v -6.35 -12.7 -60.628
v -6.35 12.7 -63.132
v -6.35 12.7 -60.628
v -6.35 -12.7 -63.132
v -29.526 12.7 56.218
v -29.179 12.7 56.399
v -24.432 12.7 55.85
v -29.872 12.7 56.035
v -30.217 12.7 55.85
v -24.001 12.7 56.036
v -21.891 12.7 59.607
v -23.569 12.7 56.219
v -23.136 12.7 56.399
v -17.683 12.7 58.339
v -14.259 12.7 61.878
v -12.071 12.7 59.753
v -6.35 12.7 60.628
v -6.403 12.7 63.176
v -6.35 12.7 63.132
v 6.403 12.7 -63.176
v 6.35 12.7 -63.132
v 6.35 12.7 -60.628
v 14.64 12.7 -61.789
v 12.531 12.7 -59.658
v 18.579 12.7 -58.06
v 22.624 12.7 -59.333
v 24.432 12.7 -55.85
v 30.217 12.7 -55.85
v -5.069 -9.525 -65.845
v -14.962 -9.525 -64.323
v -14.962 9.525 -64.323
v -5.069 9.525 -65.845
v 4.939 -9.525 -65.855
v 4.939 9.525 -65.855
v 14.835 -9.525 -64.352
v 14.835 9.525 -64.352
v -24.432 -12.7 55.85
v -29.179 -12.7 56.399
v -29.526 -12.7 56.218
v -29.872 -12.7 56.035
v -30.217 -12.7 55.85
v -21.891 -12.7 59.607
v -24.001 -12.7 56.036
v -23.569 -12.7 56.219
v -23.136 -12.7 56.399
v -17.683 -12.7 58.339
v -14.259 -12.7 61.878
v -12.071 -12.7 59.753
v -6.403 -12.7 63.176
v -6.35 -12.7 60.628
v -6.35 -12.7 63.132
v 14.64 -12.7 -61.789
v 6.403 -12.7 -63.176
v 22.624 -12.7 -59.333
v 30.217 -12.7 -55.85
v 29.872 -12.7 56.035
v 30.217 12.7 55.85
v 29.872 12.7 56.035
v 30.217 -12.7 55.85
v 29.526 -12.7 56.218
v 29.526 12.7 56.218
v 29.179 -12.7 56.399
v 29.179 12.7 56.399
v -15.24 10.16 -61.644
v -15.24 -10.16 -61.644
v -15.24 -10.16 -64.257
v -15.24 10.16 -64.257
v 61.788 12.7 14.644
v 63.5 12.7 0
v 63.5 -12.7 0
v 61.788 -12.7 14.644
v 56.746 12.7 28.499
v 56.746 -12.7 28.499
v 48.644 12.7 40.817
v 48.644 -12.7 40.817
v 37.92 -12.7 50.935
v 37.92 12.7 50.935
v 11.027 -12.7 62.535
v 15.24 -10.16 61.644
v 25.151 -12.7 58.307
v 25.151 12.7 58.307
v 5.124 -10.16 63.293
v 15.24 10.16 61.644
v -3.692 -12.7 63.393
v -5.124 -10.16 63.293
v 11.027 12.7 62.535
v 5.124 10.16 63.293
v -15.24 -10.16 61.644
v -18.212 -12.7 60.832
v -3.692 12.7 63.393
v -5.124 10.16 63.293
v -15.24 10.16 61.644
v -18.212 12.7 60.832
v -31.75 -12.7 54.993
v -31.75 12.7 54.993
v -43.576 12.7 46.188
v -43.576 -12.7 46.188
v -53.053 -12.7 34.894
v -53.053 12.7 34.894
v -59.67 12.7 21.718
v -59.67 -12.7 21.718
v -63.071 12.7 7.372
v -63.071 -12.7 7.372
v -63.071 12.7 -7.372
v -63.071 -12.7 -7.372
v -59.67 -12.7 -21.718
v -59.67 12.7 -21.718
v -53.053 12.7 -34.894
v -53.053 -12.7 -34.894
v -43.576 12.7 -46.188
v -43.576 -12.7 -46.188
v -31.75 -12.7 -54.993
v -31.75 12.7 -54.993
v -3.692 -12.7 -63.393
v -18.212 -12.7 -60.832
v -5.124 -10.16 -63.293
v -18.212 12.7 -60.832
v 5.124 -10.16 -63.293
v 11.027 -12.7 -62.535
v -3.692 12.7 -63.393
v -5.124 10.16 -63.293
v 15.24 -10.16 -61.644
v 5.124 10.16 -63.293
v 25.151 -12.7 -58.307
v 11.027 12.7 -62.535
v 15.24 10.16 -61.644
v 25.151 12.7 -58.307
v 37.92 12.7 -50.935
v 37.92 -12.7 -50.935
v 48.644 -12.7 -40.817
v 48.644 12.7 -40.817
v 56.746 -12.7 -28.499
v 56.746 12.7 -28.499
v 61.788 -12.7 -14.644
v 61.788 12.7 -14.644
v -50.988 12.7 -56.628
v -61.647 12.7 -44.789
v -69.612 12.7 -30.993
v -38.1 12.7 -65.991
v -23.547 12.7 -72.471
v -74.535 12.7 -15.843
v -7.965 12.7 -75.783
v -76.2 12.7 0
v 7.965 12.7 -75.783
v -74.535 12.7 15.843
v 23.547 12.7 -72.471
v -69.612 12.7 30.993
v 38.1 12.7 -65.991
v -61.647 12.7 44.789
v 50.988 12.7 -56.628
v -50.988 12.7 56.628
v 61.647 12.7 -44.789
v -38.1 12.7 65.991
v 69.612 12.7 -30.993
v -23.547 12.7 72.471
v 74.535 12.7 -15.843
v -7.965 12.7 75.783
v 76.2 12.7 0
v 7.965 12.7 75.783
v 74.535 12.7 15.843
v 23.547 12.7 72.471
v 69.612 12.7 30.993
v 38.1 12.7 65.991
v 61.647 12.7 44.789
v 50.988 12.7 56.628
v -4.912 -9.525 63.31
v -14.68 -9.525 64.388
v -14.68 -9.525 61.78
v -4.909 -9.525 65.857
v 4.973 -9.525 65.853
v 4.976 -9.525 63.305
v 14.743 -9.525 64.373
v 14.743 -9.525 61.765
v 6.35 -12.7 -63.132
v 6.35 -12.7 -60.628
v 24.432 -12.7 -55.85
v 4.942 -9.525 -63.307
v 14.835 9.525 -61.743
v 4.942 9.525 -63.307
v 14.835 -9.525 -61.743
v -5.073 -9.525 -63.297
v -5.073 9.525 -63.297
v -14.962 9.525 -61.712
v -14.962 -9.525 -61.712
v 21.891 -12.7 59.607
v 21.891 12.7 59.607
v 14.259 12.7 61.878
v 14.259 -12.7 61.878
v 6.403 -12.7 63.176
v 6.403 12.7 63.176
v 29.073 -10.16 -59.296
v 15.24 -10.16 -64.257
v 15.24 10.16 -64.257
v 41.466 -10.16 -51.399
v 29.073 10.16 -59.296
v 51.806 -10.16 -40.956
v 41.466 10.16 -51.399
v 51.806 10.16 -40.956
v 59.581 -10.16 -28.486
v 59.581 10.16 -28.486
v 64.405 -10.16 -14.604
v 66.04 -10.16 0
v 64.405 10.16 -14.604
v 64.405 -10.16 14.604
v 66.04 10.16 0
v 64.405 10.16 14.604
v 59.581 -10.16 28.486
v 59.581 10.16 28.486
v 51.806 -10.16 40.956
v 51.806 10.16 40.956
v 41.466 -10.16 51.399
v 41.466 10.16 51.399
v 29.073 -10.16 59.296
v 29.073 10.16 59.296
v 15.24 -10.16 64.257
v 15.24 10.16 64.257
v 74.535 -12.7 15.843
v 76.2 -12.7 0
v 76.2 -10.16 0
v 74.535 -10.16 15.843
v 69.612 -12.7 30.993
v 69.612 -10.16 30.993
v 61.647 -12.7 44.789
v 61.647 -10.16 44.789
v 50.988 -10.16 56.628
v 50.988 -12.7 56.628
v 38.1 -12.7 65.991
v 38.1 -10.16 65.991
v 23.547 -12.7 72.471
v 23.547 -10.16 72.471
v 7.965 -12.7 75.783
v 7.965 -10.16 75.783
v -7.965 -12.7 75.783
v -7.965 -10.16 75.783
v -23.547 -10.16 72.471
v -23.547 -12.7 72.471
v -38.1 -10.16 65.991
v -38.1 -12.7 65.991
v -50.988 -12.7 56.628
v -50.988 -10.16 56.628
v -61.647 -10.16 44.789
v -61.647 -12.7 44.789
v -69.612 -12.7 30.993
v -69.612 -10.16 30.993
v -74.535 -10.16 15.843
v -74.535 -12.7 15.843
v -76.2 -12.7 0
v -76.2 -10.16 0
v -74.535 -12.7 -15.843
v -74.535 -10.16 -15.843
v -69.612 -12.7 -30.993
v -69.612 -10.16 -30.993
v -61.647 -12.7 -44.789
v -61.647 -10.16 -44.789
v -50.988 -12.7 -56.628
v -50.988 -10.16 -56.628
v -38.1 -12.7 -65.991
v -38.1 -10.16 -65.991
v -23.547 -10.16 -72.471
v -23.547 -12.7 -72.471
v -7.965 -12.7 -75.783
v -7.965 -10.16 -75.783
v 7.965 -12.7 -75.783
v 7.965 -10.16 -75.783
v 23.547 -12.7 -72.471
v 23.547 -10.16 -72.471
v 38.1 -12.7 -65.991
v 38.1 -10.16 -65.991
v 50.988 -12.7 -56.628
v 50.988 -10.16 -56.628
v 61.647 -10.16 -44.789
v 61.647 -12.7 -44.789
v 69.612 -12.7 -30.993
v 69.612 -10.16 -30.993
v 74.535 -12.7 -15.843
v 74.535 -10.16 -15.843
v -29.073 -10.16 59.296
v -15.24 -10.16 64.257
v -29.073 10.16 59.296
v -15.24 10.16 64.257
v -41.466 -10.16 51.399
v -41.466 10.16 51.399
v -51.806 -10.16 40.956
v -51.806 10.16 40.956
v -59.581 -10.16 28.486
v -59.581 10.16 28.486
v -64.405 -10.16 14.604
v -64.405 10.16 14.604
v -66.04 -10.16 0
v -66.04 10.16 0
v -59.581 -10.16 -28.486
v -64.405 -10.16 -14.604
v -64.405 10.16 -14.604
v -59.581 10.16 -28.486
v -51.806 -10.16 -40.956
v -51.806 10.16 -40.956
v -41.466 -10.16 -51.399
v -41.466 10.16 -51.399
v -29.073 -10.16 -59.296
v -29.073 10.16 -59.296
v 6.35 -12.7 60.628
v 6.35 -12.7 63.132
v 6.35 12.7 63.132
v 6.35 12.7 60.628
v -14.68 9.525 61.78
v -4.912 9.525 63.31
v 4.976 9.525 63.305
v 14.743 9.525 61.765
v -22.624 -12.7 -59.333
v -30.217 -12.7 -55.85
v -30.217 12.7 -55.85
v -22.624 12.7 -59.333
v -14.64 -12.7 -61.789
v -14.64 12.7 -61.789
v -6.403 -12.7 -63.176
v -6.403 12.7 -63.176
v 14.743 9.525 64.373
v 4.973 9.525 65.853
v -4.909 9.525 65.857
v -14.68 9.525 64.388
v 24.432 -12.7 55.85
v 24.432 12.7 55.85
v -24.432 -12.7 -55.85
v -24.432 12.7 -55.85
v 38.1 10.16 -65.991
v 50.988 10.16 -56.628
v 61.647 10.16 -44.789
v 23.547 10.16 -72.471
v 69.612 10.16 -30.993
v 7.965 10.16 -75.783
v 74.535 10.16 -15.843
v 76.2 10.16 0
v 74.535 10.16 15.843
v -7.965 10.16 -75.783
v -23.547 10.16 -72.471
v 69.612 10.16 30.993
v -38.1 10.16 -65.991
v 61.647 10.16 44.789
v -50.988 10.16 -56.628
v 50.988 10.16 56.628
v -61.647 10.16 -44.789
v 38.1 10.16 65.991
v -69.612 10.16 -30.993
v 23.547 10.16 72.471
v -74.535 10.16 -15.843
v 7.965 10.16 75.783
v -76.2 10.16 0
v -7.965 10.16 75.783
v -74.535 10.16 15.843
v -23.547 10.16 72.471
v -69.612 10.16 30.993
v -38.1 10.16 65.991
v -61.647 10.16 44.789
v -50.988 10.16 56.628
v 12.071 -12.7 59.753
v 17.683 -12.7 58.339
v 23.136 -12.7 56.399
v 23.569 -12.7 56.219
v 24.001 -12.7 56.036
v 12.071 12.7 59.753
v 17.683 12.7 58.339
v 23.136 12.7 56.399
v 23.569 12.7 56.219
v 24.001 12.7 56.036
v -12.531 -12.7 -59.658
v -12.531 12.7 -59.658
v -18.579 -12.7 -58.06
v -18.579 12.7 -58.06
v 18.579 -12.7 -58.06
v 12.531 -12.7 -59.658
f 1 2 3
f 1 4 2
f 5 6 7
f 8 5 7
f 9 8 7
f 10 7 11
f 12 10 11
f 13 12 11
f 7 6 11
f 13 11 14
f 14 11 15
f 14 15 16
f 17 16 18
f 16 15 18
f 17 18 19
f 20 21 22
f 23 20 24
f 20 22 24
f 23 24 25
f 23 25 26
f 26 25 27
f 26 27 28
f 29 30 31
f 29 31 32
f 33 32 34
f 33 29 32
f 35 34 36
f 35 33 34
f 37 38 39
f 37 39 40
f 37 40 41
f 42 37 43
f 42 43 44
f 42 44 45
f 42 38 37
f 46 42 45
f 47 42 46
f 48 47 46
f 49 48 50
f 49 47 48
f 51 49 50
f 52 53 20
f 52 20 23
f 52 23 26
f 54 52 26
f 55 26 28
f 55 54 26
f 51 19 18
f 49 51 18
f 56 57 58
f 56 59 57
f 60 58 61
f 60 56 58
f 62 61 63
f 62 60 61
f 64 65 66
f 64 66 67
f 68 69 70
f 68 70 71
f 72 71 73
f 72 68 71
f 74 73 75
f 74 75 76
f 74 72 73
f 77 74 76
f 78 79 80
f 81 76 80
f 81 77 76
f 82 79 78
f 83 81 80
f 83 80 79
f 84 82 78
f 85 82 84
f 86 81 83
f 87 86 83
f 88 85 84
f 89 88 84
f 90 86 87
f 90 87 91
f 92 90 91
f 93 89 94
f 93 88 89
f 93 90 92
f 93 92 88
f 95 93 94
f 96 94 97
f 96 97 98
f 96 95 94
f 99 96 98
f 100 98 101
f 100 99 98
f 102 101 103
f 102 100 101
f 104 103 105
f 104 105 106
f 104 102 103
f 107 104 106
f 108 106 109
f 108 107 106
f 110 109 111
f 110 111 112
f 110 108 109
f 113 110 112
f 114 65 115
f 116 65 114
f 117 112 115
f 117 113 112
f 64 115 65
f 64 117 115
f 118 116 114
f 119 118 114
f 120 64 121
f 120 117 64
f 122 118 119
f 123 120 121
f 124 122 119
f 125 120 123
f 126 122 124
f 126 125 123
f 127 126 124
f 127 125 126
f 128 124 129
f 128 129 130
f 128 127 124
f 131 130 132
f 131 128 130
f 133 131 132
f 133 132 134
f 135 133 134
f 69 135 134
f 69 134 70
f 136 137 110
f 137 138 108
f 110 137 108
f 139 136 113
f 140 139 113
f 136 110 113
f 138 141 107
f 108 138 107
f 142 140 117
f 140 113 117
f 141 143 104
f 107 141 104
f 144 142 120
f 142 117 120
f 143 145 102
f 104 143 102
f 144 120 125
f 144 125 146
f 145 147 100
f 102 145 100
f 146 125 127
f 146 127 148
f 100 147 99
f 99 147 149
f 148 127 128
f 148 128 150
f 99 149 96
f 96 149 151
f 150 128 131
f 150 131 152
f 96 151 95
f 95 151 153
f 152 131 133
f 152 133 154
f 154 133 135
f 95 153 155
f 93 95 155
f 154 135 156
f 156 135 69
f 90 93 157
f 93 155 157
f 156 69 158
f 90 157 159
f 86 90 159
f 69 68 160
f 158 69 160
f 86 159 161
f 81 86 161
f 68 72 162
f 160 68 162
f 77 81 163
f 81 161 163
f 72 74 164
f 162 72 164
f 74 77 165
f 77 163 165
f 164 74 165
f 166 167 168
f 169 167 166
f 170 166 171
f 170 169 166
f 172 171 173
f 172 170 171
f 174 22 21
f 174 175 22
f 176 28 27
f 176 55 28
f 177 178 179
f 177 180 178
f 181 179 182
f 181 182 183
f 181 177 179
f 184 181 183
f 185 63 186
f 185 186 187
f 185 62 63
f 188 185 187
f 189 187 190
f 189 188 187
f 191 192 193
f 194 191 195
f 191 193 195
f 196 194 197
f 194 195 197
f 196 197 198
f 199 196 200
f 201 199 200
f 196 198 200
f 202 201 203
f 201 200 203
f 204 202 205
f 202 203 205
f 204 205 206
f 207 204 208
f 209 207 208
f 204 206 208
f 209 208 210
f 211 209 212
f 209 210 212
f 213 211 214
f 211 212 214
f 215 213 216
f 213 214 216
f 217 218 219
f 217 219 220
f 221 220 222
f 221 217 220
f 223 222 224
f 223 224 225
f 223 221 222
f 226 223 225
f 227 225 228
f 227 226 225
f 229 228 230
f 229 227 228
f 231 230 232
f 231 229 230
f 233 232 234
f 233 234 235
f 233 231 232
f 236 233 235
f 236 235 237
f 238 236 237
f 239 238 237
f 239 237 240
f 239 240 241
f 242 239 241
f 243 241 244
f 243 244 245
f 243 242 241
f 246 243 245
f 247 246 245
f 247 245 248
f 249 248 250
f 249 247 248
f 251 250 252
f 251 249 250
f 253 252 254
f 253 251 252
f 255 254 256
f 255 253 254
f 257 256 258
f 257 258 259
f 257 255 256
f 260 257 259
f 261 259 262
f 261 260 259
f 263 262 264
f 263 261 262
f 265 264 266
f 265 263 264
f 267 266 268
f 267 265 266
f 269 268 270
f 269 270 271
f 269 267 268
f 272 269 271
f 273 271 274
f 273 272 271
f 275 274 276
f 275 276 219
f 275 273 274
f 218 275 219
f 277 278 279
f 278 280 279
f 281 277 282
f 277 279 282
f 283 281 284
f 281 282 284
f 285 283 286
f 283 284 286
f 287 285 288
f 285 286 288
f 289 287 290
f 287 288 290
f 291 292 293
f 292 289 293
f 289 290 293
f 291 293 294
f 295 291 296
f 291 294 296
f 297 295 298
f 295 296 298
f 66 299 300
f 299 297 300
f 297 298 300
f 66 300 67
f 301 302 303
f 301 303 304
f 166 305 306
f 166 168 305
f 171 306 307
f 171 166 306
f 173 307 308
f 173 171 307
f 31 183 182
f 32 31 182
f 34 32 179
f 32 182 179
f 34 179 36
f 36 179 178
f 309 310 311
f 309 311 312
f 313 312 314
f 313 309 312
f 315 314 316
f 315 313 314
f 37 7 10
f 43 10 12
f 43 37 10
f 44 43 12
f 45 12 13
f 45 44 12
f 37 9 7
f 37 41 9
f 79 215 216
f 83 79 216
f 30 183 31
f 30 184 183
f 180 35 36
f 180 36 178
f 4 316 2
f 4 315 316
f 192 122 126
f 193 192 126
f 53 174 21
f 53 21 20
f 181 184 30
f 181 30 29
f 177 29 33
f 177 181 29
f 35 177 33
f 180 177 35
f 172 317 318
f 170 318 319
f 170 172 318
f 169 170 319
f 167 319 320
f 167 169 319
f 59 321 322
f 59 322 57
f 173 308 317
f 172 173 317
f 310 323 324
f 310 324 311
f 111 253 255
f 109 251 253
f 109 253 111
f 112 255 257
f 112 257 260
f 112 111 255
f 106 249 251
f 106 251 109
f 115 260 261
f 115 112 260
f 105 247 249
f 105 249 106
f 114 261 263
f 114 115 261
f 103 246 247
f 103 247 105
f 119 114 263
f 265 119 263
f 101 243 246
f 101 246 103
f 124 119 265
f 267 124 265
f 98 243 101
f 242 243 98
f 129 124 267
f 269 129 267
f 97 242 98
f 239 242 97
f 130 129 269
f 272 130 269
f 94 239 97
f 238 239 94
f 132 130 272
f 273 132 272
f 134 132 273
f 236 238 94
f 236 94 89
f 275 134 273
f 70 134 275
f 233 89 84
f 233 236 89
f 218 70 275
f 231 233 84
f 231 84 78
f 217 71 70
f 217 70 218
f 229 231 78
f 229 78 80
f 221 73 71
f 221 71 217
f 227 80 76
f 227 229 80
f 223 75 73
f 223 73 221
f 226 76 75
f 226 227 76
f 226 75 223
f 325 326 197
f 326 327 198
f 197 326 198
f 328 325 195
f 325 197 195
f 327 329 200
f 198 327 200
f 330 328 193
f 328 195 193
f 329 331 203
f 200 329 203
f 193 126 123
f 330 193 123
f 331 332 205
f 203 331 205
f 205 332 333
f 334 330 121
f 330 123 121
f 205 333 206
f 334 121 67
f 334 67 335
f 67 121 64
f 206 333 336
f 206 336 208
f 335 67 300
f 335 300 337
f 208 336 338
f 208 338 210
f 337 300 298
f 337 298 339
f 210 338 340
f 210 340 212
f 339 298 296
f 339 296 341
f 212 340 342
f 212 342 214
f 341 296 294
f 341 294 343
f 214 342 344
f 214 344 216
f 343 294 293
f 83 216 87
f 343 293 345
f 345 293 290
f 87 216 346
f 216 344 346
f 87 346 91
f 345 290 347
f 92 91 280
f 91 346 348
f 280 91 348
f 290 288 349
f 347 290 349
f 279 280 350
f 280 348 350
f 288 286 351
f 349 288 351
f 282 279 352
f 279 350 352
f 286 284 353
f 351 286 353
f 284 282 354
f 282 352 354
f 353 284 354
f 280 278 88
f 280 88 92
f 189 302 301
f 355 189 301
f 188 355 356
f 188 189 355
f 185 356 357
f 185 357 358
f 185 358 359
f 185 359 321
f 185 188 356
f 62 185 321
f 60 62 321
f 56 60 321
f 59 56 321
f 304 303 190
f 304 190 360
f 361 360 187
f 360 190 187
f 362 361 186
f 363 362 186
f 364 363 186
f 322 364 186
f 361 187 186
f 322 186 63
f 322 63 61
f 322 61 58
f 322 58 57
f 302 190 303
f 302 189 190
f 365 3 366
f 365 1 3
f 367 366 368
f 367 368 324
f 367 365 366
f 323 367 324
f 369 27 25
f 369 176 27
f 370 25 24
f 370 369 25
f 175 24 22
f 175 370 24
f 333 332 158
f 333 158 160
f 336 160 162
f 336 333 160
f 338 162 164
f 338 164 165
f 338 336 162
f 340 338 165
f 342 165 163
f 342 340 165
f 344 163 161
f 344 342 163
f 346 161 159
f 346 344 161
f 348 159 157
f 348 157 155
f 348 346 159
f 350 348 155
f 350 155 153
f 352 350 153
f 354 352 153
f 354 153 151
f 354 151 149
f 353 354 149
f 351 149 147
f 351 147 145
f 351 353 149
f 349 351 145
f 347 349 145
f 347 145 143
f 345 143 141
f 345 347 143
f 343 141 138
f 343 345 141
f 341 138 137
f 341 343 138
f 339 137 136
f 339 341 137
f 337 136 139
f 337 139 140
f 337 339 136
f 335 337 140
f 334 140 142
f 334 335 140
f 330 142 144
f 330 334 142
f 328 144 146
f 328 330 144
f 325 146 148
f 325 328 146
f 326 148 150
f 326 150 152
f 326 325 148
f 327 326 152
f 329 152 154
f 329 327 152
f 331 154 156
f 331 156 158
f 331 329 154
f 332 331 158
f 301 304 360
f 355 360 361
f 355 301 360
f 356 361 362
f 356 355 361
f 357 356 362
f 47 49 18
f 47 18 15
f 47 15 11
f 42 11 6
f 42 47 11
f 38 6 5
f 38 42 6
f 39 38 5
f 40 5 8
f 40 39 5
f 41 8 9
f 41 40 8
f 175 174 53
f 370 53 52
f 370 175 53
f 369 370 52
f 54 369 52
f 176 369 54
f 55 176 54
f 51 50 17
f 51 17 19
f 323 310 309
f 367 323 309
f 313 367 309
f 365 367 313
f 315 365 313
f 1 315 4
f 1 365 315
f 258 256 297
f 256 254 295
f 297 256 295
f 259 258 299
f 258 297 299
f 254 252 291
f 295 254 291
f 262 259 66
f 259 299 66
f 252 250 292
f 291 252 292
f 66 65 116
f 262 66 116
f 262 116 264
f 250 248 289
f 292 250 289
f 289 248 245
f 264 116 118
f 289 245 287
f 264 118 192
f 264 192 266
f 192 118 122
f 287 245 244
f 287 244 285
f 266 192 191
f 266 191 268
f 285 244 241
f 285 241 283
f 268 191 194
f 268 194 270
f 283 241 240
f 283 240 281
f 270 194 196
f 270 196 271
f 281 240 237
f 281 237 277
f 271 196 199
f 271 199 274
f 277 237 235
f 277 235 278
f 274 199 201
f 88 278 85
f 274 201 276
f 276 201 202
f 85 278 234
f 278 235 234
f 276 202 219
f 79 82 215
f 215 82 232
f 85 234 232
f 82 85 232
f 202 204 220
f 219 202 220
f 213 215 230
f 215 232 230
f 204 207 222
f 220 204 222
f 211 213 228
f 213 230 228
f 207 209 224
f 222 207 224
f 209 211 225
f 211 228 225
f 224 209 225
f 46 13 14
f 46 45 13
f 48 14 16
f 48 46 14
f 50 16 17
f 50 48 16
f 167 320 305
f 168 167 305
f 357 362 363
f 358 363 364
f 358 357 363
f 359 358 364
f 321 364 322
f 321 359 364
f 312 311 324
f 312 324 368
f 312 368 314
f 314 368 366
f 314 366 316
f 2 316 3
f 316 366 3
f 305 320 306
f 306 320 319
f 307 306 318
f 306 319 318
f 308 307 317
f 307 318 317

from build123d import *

# Parameters (mm, degrees)
F0_R     = 76.2
F0_R_2   = 63.5
F1_DEPTH = 12.7
F3_T     = -2.54
F2_W     = 15.24
F2_H     = 20.32
F4_DEPTH = 66.04
F6_DEPTH = 9.525
F8_DEPTH = 12.7


with BuildPart() as f1:
    # F0 (on Front) → F1 (new body, symmetric)
    with BuildSketch(Plane.XZ):
        Circle(F0_R)
        Circle(F0_R_2, mode=Mode.SUBTRACT)
    extrude(amount=F1_DEPTH, both=True)

    # F3
    f3_openings = [f1.faces().sort_by_distance(p)[0] for p in [
        (-76.2, 0, 0),
    ]]
    offset(amount=F3_T, openings=f3_openings)

    # F2 (on Top) → F4 (cut, symmetric)
    with BuildSketch(Plane.XY):
        with Locations((-7.62, 0)):
            Rectangle(F2_W, F2_H)
        with Locations((7.62, 0)):
            Rectangle(F2_W, F2_H)
    extrude(amount=F4_DEPTH, both=True, mode=Mode.SUBTRACT)


with BuildPart() as f6:
    # F5 (on Front) → F6 (new body, symmetric)
    with BuildSketch(Plane.XZ):
        with BuildLine():
            ThreePointArc((-14.6804592455, 61.7797225337), (0.0322033107, 63.4999918342), (14.7431134689, 61.7648006978))
            Line((14.7431134689, 61.7648006978), (14.7431134689, 64.3733035135))
            ThreePointArc((14.7431134689, 64.3733035135), (0.0321346281, 66.0399921818), (-14.6804592455, 64.3876208315))
            Line((-14.6804592455, 64.3876208315), (-14.6804592455, 61.7797225337))
        make_face()
    extrude(amount=F6_DEPTH, both=True)


with BuildPart() as f6b:
    # F5 (on Front) → F6, piece 2 (new body, symmetric)
    with BuildSketch(Plane.XZ):
        with BuildLine():
            Line((-14.9617508265, -61.7122031061), (-14.9617508265, -64.3228389626))
            ThreePointArc((-14.9617508265, -64.3228389626), (-0.0652215525, -66.0399677934), (14.834670357, -64.3522661248))
            Line((14.834670357, -64.3522661248), (14.834670357, -61.7428745314))
            ThreePointArc((14.834670357, -61.7428745314), (-0.0653647116, -63.4999663579), (-14.9617508265, -61.7122031061))
        make_face()
    extrude(amount=F6_DEPTH, both=True)


with BuildPart() as f8:
    # F7 (on Front) → F8 (new body, symmetric)
    with BuildSketch(Plane.XZ):
        with BuildLine():
            ThreePointArc((-6.35, -60.6283687724), (-15.575286476, -58.9366783183), (-24.431876042, -55.8498436262))
            Line((-24.431876042, -55.8498436262), (-30.2166339444, -55.8498436262))
            ThreePointArc((-30.2166339444, -55.8498436262), (-18.6726647382, -60.6925167675), (-6.4029763415, -63.1763554977))
            Line((-6.4029763415, -63.1763554977), (-6.35, -63.1315240057))
            Line((-6.35, -63.1315240057), (-6.35, -60.6283687724))
        make_face()
    extrude(amount=F8_DEPTH, both=True)


with BuildPart() as f8b:
    # F7 (on Front) → F8, piece 2 (new body, symmetric)
    with BuildSketch(Plane.XZ):
        with BuildLine():
            ThreePointArc((-23.1361730152, 56.3989281654), (-14.8939800501, 59.1125279299), (-6.35, 60.6283687724))
            Line((-6.35, 60.6283687724), (-6.35, 63.1315240057))
            Line((-6.35, 63.1315240057), (-6.4029763415, 63.1763554977))
            ThreePointArc((-6.4029763415, 63.1763554977), (-18.1108167509, 60.8625362322), (-29.1789462077, 56.3989281654))
            Line((-29.1789462077, 56.3989281654), (-23.1361730152, 56.3989281654))
        make_face()
        with BuildLine():
            ThreePointArc((-24.431876042, 55.8498436262), (-23.7856090154, 56.1281248909), (-23.1361730152, 56.3989281654))
            Line((-23.1361730152, 56.3989281654), (-29.1789462077, 56.3989281654))
            ThreePointArc((-29.1789462077, 56.3989281654), (-29.6990590568, 56.1267840798), (-30.2166339444, 55.8498436262))
            Line((-30.2166339444, 55.8498436262), (-24.431876042, 55.8498436262))
        make_face()
    extrude(amount=F8_DEPTH, both=True)


with BuildPart() as f8c:
    # F7 (on Front) → F8, piece 3 (new body, symmetric)
    with BuildSketch(Plane.XZ):
        with BuildLine():
            Line((6.4029763415, 63.1763554977), (6.35, 63.1315240057))
            Line((6.35, 63.1315240057), (6.35, 60.6283687724))
            ThreePointArc((6.35, 60.6283687724), (14.8939800501, 59.1125279299), (23.1361730152, 56.3989281654))
            Line((23.1361730152, 56.3989281654), (29.1789462077, 56.3989281654))
            ThreePointArc((29.1789462077, 56.3989281654), (18.1108167509, 60.8625362322), (6.4029763415, 63.1763554977))
        make_face()
        with BuildLine():
            Line((29.1789462077, 56.3989281654), (23.1361730152, 56.3989281654))
            ThreePointArc((23.1361730152, 56.3989281654), (23.7856090154, 56.1281248909), (24.431876042, 55.8498436262))
            Line((24.431876042, 55.8498436262), (30.2166339444, 55.8498436262))
            ThreePointArc((30.2166339444, 55.8498436262), (29.6990590568, 56.1267840798), (29.1789462077, 56.3989281654))
        make_face()
    extrude(amount=F8_DEPTH, both=True)


with BuildPart() as f8d:
    # F7 (on Front) → F8, piece 4 (new body, symmetric)
    with BuildSketch(Plane.XZ):
        with BuildLine():
            Line((6.35, -60.6283687724), (6.35, -63.1315240057))
            Line((6.35, -63.1315240057), (6.4029763415, -63.1763554977))
            ThreePointArc((6.4029763415, -63.1763554977), (18.6726647382, -60.6925167675), (30.2166339444, -55.8498436262))
            Line((30.2166339444, -55.8498436262), (24.431876042, -55.8498436262))
            ThreePointArc((24.431876042, -55.8498436262), (15.575286476, -58.9366783183), (6.35, -60.6283687724))
        make_face()
    extrude(amount=F8_DEPTH, both=True)


solid = Compound([f1.part, f6.part, f6b.part, f8.part, f8b.part, f8c.part, f8d.part])
